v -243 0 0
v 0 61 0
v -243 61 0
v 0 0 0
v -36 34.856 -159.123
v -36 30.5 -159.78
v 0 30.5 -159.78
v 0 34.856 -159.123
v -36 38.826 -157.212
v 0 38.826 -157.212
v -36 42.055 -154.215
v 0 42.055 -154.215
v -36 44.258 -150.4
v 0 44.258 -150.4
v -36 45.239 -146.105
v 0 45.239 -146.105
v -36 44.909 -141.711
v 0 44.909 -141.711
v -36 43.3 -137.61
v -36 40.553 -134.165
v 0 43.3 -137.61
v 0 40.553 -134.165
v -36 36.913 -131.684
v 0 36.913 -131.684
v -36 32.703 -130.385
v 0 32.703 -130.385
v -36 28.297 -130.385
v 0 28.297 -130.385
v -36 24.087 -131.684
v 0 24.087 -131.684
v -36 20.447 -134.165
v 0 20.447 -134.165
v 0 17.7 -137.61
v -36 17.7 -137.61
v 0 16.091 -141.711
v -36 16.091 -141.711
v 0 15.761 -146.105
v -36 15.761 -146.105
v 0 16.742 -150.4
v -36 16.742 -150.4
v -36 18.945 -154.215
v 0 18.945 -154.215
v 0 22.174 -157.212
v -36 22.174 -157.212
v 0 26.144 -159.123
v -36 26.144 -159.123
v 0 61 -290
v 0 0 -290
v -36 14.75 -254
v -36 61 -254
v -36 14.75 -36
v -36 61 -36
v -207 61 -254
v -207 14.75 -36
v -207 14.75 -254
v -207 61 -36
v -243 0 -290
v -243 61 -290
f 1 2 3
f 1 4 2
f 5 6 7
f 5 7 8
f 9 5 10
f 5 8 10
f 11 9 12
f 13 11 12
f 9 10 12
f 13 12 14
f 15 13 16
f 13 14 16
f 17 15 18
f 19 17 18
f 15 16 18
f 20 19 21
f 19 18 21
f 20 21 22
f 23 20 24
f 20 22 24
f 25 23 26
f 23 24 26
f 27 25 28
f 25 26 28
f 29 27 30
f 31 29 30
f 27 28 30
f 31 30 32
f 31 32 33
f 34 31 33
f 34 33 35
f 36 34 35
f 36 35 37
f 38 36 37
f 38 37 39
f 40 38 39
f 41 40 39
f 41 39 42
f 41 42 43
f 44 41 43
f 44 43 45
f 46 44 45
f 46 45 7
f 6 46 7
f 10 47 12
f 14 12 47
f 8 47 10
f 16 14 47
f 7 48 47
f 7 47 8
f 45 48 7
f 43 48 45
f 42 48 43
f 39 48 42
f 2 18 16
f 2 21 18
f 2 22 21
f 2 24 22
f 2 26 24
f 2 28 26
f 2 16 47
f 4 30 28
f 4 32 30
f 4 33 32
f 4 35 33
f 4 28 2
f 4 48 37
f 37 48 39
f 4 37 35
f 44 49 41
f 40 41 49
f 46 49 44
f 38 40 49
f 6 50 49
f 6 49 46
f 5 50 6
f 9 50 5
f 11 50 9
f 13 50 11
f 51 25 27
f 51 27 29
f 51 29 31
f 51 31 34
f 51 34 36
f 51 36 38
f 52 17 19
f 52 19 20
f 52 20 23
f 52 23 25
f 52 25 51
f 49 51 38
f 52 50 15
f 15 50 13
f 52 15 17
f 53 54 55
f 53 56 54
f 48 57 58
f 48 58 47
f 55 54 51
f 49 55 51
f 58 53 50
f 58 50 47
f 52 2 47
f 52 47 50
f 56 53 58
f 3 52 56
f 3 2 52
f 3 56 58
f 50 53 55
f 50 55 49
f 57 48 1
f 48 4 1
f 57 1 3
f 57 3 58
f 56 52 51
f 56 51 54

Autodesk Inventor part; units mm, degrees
ref_plane "YZ Plane" through (0, 0, 0) normal (1, 0, 0) x (0, 1, 0)
ref_plane "XZ Plane" through (0, 0, 0) normal (0, 1, 0) x (-1, 0, 0)
ref_plane "XY Plane" through (0, 0, 0) normal (0, 0, 1) x (1, 0, 0)
sketch "Boceto2" plane through (0, 0, 0) normal (0, 1, 0) x (-1, 0, 0)
  line L0 (0, 0) -> (243, 0)
  line L1 (243, 0) -> (243, -290)
  line L2 (243, -290) -> (0, -290)
  line L3 (0, -290) -> (0, 0)
  dimension "d4" = 243
  dimension "d5" = 290
extrude "Extrusión2" add sketch "Boceto2" along normal blind 61
sketch "Boceto3" plane through (0, 61, 0) normal (0, 1, 0) x (1, 0, 0)
  line L0 (0, 290) -> (-243, 290) projected
  line L1 (-243, 290) -> (-243, 0) projected
  line L2 (-243, 0) -> (0, 0) projected
  line L3 (0, 0) -> (0, 290) projected
  line L4 (-207, 36) -> (-207, 254)
  line L5 (-207, 254) -> (-36, 254)
  line L6 (-36, 254) -> (-36, 36)
  line L7 (-36, 36) -> (-207, 36)
  dimension "d8" = 36
sketch "Boceto4" plane through (0, 0, 0) normal (1, 0, 0) x (0, 0, -1)
  line L0 (0, 0) -> (290, 0) projected
  line L1 (290, 0) -> (290, 61) projected
  line L2 (0, 61) -> (290, 61) projected
  line L3 (0, 0) -> (0, 61) projected
  circle A0 centre (145, 30.5) radius 14.78
  dimension "d9" = 29.56
extrude "Extrusión3" cut sketch "Boceto4" against normal blind 69.75 contours A0
extrude "Extrusión4" cut sketch "Boceto3" against normal blind 46.25 contours L4 L5 L6 L7
properties part number "MADERA"
